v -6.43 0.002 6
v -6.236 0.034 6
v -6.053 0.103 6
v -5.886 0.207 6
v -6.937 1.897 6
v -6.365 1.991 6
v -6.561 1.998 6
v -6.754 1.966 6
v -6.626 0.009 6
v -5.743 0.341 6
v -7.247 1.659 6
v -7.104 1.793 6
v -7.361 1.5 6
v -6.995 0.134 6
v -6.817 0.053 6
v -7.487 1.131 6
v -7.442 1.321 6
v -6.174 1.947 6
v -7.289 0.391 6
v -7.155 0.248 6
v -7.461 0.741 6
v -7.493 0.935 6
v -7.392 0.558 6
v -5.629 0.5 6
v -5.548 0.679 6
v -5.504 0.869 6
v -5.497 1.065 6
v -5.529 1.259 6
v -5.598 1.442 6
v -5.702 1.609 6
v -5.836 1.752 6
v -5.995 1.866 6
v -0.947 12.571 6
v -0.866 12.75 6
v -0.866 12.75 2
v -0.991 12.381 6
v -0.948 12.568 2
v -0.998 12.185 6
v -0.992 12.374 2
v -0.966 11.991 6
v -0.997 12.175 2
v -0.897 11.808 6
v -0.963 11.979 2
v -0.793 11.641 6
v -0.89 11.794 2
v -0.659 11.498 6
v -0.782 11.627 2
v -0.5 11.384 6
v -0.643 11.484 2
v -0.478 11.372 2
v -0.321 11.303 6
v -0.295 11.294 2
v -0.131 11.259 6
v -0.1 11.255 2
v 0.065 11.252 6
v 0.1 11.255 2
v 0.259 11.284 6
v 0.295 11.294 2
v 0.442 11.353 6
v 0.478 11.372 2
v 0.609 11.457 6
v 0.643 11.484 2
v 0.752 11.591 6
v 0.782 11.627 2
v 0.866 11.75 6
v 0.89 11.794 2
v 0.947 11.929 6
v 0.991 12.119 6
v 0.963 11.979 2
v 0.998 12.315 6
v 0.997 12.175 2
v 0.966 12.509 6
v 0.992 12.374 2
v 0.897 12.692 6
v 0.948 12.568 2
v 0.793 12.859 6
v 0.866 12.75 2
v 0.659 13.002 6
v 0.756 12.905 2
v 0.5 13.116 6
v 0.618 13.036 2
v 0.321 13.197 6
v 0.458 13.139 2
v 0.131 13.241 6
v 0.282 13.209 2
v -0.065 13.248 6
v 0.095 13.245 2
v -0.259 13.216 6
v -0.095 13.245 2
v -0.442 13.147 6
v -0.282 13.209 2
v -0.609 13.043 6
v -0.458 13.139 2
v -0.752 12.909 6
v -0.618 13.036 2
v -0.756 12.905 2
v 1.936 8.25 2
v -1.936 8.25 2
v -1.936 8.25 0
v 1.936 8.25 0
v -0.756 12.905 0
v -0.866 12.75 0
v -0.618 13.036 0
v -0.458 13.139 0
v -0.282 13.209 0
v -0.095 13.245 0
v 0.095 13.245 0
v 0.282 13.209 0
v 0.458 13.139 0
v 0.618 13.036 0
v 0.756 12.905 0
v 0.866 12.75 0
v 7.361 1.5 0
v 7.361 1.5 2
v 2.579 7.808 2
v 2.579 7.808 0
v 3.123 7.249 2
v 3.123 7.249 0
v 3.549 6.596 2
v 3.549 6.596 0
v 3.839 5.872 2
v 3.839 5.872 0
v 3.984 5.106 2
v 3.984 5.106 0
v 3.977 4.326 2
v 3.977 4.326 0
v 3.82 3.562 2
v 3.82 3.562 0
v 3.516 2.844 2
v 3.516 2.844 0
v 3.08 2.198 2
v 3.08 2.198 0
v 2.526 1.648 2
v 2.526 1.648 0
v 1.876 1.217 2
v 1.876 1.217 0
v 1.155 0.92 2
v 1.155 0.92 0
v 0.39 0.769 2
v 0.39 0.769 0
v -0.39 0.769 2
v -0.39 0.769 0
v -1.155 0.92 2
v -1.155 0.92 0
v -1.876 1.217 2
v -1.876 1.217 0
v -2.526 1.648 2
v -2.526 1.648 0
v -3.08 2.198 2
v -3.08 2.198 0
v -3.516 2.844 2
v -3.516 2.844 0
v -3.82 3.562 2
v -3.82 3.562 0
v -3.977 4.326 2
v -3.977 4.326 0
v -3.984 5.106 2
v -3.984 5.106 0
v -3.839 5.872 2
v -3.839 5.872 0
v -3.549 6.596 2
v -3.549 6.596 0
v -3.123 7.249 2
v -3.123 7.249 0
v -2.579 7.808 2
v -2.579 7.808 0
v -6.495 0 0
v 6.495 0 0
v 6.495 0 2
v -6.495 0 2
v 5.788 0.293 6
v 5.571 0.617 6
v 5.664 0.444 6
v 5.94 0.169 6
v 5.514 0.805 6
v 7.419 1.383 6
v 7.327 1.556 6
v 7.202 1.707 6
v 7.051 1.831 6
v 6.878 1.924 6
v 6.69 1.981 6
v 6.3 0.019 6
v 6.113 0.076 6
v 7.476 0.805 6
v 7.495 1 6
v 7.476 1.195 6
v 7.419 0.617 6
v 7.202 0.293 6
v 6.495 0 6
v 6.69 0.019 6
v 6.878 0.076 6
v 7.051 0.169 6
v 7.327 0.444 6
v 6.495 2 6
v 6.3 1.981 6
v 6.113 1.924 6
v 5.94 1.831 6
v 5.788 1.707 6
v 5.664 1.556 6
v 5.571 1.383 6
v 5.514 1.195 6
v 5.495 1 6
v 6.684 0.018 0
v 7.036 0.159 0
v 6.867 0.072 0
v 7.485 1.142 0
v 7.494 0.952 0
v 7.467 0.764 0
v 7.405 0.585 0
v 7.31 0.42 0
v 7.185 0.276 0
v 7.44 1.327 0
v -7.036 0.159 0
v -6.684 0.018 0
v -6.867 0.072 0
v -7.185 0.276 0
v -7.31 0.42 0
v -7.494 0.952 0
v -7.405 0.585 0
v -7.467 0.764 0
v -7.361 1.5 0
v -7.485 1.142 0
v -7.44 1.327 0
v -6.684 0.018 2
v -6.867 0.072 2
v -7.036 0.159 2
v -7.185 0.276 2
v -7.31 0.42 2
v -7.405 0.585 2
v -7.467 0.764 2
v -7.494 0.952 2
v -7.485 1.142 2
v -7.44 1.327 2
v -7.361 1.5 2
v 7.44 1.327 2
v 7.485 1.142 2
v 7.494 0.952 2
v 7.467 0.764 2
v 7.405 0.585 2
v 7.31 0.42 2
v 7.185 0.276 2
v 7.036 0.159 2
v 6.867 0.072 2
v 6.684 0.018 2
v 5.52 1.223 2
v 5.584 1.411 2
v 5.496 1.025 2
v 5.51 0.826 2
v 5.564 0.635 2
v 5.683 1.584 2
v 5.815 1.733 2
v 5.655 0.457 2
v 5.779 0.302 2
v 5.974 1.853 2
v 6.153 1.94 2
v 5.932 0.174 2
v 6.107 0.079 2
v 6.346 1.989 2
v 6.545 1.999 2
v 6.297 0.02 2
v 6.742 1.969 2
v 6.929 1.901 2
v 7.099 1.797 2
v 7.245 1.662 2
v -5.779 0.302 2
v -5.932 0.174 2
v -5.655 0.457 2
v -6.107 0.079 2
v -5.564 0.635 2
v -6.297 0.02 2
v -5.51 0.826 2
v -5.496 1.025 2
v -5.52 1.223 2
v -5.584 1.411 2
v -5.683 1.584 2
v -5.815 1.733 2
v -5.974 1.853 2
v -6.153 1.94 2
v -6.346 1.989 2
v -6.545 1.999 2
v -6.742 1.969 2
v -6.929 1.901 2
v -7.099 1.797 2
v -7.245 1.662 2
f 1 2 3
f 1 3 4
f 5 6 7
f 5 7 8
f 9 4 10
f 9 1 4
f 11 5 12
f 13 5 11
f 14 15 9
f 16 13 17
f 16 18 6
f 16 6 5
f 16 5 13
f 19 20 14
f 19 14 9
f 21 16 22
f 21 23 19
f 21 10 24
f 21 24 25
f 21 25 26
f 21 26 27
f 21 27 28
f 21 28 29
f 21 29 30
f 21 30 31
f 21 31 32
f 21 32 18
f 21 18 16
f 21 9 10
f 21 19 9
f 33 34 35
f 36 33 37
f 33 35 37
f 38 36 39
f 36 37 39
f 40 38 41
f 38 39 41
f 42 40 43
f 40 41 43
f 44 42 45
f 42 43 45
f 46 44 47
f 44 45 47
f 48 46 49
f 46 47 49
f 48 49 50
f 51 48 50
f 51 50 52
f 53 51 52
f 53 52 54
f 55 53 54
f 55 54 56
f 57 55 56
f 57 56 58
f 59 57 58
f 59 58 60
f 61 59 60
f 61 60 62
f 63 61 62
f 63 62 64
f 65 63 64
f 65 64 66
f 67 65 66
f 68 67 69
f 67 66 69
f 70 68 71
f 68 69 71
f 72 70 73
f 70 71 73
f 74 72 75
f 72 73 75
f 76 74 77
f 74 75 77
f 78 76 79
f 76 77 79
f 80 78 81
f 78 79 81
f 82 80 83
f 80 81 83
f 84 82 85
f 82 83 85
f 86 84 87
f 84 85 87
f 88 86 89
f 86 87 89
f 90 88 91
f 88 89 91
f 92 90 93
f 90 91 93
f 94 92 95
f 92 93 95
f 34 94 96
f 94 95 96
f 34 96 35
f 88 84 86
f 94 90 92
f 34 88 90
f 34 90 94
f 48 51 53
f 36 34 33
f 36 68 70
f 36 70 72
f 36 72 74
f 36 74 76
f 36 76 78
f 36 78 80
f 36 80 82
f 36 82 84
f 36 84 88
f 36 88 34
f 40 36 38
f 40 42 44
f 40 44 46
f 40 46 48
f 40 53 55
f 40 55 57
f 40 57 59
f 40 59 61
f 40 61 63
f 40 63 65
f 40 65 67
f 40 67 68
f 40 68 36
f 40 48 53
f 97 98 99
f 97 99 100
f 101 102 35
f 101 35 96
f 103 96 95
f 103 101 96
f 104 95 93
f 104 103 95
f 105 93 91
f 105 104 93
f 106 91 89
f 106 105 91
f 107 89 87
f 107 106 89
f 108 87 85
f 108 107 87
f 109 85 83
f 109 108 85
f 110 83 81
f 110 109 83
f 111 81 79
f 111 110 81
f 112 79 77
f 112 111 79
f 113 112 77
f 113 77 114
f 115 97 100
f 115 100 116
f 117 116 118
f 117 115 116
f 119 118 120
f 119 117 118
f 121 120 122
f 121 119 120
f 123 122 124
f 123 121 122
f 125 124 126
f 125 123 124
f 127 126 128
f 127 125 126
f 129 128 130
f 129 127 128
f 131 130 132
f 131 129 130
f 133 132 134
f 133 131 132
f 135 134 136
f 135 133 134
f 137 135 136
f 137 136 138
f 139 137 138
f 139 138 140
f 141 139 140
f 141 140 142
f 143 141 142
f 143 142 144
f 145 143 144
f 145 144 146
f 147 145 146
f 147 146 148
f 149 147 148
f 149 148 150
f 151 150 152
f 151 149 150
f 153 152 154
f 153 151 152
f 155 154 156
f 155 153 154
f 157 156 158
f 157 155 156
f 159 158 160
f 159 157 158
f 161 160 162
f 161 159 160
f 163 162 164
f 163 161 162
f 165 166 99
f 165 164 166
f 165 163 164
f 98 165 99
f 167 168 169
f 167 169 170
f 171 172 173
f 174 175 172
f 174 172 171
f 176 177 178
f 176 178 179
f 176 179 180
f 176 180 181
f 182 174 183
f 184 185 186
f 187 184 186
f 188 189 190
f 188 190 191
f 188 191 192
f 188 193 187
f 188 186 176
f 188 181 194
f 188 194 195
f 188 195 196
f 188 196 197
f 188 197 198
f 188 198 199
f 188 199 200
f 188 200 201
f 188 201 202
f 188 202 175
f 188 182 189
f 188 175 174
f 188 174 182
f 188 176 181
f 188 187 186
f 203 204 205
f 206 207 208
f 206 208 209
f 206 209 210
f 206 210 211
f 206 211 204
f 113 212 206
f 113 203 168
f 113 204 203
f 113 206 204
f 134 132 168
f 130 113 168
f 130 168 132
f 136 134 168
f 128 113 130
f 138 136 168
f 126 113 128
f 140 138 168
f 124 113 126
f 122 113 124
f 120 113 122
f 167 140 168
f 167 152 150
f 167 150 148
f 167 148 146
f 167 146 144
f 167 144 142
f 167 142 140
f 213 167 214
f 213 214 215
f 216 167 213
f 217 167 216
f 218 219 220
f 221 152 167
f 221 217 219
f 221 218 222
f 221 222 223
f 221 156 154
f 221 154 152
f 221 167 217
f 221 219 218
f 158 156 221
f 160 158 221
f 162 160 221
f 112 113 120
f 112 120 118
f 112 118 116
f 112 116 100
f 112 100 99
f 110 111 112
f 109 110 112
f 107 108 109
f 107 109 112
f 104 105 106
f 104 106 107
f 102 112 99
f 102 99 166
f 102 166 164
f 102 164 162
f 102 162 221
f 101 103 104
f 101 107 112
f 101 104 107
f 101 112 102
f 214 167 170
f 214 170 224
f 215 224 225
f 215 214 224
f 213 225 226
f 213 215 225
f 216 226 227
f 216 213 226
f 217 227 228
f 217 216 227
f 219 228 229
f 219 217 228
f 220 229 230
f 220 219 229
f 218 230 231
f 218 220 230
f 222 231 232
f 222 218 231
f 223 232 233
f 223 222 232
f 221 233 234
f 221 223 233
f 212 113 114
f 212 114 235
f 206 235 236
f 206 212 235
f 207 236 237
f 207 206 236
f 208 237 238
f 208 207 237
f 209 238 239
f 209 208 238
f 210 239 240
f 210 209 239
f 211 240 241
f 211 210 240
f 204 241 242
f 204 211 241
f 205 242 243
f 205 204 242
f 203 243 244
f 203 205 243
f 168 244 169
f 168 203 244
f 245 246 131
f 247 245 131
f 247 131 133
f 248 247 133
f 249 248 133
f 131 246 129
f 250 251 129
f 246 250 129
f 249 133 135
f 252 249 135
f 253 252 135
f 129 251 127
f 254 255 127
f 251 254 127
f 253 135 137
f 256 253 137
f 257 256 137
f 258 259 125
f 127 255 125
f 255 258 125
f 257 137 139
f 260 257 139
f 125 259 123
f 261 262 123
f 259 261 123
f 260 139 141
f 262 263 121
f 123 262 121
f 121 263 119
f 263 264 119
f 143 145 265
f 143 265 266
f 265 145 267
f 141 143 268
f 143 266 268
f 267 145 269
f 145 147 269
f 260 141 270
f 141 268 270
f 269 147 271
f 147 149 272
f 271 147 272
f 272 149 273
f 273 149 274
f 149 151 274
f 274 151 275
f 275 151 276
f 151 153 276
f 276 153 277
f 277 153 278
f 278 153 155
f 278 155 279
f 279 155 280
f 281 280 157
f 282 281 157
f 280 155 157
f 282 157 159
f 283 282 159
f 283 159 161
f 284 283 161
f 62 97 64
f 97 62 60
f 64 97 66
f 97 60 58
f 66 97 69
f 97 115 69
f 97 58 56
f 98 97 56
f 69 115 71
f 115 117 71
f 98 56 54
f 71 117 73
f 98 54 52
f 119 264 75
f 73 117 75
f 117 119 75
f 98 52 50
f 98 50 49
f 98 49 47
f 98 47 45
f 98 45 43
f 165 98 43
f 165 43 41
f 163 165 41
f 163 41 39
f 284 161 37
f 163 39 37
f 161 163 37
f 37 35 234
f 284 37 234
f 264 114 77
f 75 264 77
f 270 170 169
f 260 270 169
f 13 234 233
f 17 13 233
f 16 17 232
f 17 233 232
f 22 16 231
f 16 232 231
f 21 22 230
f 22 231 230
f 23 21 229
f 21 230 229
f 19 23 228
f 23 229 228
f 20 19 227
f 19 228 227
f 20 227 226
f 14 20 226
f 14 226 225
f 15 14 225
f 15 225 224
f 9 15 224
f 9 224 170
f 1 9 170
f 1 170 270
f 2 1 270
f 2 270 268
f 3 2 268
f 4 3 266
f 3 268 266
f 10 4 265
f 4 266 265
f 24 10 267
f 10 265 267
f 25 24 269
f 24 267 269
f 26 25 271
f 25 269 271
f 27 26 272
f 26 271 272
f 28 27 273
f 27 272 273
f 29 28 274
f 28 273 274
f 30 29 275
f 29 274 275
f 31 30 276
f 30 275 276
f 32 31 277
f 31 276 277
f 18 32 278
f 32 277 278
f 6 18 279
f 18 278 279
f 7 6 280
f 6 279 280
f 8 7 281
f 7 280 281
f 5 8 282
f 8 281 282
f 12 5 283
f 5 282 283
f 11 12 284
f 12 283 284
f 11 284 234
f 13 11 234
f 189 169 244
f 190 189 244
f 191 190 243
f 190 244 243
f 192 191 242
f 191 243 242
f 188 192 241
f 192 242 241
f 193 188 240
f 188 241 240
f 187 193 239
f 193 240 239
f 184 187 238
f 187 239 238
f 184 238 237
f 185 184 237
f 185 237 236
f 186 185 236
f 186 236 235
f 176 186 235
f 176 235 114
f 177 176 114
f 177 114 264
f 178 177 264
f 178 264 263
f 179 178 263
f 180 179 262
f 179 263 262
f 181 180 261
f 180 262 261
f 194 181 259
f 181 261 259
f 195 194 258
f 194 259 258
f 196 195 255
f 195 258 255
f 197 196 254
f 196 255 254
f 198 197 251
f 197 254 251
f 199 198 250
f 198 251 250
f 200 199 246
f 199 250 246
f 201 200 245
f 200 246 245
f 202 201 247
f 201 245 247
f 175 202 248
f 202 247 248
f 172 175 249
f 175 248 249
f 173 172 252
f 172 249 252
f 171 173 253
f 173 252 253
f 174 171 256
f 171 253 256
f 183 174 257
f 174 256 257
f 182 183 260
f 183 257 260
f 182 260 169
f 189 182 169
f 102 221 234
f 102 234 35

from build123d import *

# Parameters (mm, degrees)
EXTRUDE_1_DEPTH     = 2
SKETCH_2_R          = 1
EXTRUDE_2_DEPTH     = 4
CUT_EXTRUDE_4_DEPTH = 5


with BuildPart() as part:
    # 草图1 → 凸台-拉伸1 (new body)
    with BuildSketch(Plane.XY):
        with BuildLine():
            Line((-7.361215932, 1.5), (-0.866025404, 12.75))
            ThreePointArc((-0.866025404, 12.75), (0, 13.25), (0.866025404, 12.75))
            Line((0.866025404, 12.75), (7.361215932, 1.5))
            ThreePointArc((7.361215932, 1.5), (7.361215932, 0.5), (6.495190528, 0))
            Line((6.495190528, 0), (-6.495190528, 0))
            ThreePointArc((-6.495190528, 0), (-7.361215932, 0.5), (-7.361215932, 1.5))
        make_face()
    extrude(amount=EXTRUDE_1_DEPTH)

    # 草图2 → 凸台-拉伸2 (add)
    with BuildSketch(Plane.XY.offset(2)):
        with Locations(Location((0, 12.25, 0), (0, 0, 150))):
            Circle(SKETCH_2_R)
        with Locations(Location((6.495190528, 1, 0), (0, 0, 270))):
            Circle(SKETCH_2_R)
        with Locations(Location((-6.495190528, 1, 0), (0, 0, 150))):
            Circle(SKETCH_2_R)
    extrude(amount=EXTRUDE_2_DEPTH)

    # 草图3 → 切除-拉伸4 (cut)
    with BuildSketch(Plane.XY.offset(2)):
        with BuildLine():
            Line((-1.936491673, 8.25), (1.936491673, 8.25))
            ThreePointArc((1.936491673, 8.25), (0, 0.75), (-1.936491673, 8.25))
        make_face()
    extrude(amount=-CUT_EXTRUDE_4_DEPTH, mode=Mode.SUBTRACT)


solid = part.part
